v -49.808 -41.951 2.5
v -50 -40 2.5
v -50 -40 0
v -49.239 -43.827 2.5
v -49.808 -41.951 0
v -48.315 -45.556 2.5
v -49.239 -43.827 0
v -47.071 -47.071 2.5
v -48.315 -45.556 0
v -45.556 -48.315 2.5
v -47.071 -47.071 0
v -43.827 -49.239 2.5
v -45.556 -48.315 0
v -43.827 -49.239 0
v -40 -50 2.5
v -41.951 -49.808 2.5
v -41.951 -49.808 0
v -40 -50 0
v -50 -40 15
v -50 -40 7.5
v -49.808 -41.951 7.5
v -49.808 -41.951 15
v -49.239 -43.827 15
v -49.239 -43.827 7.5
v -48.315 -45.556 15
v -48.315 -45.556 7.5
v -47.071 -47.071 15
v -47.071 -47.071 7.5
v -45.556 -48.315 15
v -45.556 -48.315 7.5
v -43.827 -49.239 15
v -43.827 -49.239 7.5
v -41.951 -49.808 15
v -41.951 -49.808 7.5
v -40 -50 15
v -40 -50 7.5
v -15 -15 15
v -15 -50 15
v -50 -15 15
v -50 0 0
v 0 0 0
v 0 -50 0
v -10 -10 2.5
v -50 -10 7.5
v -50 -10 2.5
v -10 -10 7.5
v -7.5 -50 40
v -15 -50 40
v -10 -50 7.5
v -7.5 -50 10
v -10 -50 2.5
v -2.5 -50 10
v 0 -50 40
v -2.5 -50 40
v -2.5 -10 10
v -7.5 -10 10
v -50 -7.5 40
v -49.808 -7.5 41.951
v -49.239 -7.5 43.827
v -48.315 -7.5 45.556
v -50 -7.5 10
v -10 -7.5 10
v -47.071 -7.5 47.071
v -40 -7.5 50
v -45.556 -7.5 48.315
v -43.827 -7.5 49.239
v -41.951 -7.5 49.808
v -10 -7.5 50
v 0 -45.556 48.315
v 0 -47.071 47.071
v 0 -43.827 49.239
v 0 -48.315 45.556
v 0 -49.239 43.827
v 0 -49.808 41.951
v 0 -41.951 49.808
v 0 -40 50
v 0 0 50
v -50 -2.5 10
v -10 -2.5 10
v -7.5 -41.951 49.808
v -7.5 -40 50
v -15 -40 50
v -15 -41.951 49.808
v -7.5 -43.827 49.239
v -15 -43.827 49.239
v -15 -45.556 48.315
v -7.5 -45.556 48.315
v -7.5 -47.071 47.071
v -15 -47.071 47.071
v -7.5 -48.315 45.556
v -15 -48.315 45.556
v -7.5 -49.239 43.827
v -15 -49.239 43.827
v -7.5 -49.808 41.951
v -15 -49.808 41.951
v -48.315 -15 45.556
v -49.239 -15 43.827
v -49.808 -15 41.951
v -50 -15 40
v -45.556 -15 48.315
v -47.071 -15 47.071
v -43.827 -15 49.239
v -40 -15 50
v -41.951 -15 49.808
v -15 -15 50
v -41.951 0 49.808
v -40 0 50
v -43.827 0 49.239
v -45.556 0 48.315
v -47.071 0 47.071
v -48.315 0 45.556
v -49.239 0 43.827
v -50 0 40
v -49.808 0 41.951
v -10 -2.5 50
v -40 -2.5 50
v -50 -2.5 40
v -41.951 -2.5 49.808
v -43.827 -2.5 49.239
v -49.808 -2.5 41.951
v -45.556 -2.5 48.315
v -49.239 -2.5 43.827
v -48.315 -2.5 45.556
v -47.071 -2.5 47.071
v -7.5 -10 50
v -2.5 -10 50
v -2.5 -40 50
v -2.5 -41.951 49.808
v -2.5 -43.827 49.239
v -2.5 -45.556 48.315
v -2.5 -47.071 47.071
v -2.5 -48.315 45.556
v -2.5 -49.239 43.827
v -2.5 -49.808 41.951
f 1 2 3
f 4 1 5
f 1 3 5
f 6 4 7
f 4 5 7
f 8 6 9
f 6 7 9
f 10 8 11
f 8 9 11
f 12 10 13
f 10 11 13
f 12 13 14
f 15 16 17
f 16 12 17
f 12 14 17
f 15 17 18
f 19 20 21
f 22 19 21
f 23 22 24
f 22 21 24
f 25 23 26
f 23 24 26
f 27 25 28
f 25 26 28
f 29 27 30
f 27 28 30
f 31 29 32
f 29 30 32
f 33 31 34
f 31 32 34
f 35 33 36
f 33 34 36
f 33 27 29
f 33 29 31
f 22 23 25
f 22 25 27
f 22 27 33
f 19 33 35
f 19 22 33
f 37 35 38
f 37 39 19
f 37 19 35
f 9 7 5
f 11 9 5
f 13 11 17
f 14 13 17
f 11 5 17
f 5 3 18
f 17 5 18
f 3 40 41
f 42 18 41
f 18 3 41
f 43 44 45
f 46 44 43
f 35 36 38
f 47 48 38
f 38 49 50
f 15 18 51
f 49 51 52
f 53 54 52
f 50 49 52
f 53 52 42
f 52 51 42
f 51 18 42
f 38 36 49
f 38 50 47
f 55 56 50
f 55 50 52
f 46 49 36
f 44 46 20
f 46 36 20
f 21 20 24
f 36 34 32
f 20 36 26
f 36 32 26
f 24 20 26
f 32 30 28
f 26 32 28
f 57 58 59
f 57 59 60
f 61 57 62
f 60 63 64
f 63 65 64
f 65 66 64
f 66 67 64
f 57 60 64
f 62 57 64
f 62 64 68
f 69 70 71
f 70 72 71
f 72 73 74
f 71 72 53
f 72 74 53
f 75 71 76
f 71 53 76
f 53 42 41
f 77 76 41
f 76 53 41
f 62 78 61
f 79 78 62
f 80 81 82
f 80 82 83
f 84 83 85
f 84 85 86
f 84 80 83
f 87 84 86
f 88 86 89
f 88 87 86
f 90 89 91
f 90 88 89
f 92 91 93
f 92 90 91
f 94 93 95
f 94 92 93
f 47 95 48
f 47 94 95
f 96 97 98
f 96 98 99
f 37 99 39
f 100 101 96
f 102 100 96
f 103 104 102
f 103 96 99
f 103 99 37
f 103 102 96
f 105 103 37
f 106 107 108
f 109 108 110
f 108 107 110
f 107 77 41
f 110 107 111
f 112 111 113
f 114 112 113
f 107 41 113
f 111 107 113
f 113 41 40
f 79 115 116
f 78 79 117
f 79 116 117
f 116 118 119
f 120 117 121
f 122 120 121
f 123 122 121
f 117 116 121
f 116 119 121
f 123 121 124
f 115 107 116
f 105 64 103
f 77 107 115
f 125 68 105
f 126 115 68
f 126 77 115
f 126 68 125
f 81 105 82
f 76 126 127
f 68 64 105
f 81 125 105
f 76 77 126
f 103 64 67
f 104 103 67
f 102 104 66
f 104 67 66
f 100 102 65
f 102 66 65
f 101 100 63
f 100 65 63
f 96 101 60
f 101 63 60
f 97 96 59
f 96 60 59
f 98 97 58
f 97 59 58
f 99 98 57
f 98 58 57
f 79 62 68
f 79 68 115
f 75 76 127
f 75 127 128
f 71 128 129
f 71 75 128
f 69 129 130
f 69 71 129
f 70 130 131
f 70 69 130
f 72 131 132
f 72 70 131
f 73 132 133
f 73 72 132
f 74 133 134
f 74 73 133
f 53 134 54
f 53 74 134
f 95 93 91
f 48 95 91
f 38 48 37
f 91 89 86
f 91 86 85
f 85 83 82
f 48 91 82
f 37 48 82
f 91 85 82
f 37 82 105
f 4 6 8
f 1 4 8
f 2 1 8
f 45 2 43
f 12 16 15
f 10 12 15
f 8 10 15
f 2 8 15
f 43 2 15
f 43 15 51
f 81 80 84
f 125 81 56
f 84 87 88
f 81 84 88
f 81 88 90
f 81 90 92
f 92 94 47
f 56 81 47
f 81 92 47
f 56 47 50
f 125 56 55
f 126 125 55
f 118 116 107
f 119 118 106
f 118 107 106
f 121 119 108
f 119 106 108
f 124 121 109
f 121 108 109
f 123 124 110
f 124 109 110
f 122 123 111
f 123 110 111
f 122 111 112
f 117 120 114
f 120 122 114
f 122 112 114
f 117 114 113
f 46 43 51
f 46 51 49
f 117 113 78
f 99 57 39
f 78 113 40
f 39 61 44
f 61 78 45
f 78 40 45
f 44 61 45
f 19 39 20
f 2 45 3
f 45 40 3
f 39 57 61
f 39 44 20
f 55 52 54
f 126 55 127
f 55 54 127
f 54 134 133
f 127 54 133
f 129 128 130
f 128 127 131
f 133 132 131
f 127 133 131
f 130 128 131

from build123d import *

# Parameters (mm, degrees)
F1_DEPTH = 15
F3_DEPTH = 15
F5_DEPTH = 15
F6_W     = 20
F6_H     = 5
F6_W_2   = 5
F6_H_2   = 30
F6_H_3   = 20
F7_DEPTH = 40
F8_W     = 30
F8_H     = 5
F8_W_2   = 20
F9_DEPTH = 40


# Not quite as in the source:
# - a feature names something its author has since deleted; it is built from what else it names


with BuildPart() as f1:
    # F0 (on Top) → F1 (new body)
    with BuildSketch(Plane.XY):
        with BuildLine():
            Line((0, -50), (0, 0))
            Line((0, 0), (-50, 0))
            Line((-50, 0), (-50, -40))
            ThreePointArc((-50, -40), (-47.0710678119, -47.0710678119), (-40, -50))
            Line((-40, -50), (0, -50))
        make_face()
    extrude(amount=F1_DEPTH)

    # F2 (on Right) → F3 (join)
    with BuildSketch(Plane.YZ):
        with BuildLine():
            Line((-50, 10), (0, 10))
            Line((0, 10), (0, 50))
            Line((0, 50), (-40, 50))
            ThreePointArc((-40, 50), (-47.0710678119, 47.0710678119), (-50, 40))
            Line((-50, 40), (-50, 10))
        make_face()
    extrude(amount=-F3_DEPTH)

    # F4 (on Front) → F5 (join)
    with BuildSketch(Plane.XZ):
        with BuildLine():
            Line((-50, 10), (-10, 10))
            Line((-10, 10), (-10, 50))
            Line((-10, 50), (-40, 50))
            ThreePointArc((-40, 50), (-47.0710678119, 47.0710678119), (-50, 40))
            Line((-50, 40), (-50, 10))
        make_face()
    extrude(amount=F5_DEPTH)

    # F6 (on face) → F7 (cut)
    with BuildSketch(Plane.XZ.offset(50)):
        Polygon((-15, 2.5), (-10, 2.5), (-10, 7.5), (-40, 7.5), (-40, 2.5), align=None)
        with Locations((-50, 5)):
            Rectangle(F6_W, F6_H)
        with Locations((-5, 25)):
            Rectangle(F6_W_2, F6_H_2)
        with Locations((-5, 50)):
            Rectangle(F6_W_2, F6_H_3)
    extrude(amount=-F7_DEPTH, mode=Mode.SUBTRACT)

    # F8 (on face) → F9 (cut)
    with BuildSketch(Plane.XY.offset(50)):
        with Locations((-25, -5)):
            Rectangle(F8_W, F8_H)
        with Locations((-50, -5)):
            Rectangle(F8_W_2, F8_H)
    extrude(amount=-F9_DEPTH, mode=Mode.SUBTRACT)


solid = f1.part
